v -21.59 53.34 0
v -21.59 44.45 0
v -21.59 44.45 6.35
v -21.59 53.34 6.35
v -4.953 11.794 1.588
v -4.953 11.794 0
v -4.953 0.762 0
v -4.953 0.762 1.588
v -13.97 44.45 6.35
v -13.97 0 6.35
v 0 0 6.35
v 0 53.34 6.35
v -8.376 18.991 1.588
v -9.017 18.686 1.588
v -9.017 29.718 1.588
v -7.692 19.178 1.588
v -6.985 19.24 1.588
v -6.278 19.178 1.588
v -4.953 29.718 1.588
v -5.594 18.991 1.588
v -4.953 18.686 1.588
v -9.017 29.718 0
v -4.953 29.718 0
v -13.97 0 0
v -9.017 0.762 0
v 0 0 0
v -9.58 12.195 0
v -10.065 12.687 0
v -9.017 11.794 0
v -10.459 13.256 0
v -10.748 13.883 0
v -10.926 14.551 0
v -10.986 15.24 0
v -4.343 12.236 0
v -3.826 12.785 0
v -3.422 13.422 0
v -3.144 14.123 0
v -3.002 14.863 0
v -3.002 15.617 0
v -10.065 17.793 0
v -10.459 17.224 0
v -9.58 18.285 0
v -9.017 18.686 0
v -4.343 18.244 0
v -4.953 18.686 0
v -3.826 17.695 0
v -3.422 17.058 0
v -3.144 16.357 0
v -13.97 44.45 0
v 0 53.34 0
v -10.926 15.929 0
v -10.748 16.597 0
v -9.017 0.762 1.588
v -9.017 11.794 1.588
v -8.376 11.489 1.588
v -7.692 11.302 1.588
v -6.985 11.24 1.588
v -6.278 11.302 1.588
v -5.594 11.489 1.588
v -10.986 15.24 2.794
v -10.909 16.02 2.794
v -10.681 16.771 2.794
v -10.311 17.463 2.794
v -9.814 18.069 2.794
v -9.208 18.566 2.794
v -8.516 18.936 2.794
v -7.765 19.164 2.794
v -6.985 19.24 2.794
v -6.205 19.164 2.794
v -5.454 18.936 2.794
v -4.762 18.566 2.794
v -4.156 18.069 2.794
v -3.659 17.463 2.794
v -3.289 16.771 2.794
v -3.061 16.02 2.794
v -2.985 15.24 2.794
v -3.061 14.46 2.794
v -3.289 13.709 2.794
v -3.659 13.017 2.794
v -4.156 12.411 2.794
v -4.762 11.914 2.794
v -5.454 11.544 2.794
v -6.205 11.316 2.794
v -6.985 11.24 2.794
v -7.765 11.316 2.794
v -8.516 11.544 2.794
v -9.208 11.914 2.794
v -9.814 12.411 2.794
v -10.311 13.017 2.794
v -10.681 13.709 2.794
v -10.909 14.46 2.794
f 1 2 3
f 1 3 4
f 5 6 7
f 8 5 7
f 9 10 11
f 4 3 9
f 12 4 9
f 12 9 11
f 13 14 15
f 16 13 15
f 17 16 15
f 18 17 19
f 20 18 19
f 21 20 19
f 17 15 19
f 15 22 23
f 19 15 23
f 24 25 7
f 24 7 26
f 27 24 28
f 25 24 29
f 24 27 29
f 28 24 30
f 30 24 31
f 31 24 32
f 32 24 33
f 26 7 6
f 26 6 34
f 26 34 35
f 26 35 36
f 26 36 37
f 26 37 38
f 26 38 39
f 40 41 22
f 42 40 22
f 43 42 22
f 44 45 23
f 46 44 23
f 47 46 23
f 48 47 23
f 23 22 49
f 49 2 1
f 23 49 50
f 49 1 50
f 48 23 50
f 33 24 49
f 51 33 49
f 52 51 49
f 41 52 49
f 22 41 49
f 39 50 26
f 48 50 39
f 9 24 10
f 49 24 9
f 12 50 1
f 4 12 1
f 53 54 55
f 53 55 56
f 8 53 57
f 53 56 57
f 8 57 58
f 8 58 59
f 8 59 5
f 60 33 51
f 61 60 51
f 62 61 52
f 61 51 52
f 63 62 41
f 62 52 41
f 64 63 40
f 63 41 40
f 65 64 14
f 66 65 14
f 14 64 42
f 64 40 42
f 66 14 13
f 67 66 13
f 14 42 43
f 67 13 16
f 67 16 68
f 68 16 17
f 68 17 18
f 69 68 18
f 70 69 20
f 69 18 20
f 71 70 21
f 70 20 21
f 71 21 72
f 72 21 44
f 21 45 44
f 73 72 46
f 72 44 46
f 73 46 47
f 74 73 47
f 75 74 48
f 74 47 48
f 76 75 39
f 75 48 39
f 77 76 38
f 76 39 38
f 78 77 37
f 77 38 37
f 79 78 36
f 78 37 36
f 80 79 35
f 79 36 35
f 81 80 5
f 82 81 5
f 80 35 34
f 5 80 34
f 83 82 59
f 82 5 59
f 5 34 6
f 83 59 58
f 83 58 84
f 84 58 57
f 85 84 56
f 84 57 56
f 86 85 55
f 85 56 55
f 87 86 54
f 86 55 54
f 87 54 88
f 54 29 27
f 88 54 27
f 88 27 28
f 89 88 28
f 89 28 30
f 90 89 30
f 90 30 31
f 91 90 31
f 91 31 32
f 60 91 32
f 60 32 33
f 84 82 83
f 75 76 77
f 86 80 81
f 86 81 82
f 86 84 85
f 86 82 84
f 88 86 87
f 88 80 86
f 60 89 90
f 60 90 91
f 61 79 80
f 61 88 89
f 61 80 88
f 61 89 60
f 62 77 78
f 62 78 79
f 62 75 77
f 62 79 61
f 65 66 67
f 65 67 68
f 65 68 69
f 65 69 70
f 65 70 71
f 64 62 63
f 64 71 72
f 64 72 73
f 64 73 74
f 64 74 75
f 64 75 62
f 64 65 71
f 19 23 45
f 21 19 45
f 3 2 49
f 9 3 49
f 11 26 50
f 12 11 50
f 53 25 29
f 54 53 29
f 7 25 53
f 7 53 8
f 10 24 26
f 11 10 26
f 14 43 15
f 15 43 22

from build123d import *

# Parameters (mm, degrees)
SKETCH2_W           = 7.62
SKETCH2_H           = 8.89
SKETCH2_W_2         = 13.97
SKETCH2_H_2         = 44.45
BOSS_EXTRUDE1_DEPTH = 6.35
SKETCH3_R           = 4.0005
CUT_EXTRUDE1_DEPTH  = 2.794
CUT_EXTRUDE2_DEPTH  = 1.5875


with BuildPart() as part:
    # Sketch2 → Boss-Extrude1 (new body)
    with BuildSketch(Plane.XY):
        with Locations((-17.78, 48.895)):
            Rectangle(SKETCH2_W, SKETCH2_H)
        with Locations((-6.985, 48.895)):
            Rectangle(SKETCH2_W_2, SKETCH2_H)
        with Locations((-6.985, 22.225)):
            Rectangle(SKETCH2_W_2, SKETCH2_H_2)
    extrude(amount=BOSS_EXTRUDE1_DEPTH)

    # Sketch3 → Cut-Extrude1 (cut)
    with BuildSketch(Plane(origin=(0, 0, 0), x_dir=(-1, 0, 0), z_dir=(0, 0, -1))):
        with Locations((6.985, 15.24)):
            Circle(SKETCH3_R)
    extrude(amount=-CUT_EXTRUDE1_DEPTH, mode=Mode.SUBTRACT)

    # Sketch4 → Cut-Extrude2 (cut)
    with BuildSketch(Plane(origin=(0, 0, 0), x_dir=(-1, 0, 0), z_dir=(0, 0, -1))):
        Polygon((6.985, 29.718), (9.017, 29.718), (9.017, 15.24), (9.017, 0.762), (4.953, 0.762), (4.953, 15.24), (4.953, 29.718), align=None)
    extrude(amount=-CUT_EXTRUDE2_DEPTH, mode=Mode.SUBTRACT)


solid = part.part
